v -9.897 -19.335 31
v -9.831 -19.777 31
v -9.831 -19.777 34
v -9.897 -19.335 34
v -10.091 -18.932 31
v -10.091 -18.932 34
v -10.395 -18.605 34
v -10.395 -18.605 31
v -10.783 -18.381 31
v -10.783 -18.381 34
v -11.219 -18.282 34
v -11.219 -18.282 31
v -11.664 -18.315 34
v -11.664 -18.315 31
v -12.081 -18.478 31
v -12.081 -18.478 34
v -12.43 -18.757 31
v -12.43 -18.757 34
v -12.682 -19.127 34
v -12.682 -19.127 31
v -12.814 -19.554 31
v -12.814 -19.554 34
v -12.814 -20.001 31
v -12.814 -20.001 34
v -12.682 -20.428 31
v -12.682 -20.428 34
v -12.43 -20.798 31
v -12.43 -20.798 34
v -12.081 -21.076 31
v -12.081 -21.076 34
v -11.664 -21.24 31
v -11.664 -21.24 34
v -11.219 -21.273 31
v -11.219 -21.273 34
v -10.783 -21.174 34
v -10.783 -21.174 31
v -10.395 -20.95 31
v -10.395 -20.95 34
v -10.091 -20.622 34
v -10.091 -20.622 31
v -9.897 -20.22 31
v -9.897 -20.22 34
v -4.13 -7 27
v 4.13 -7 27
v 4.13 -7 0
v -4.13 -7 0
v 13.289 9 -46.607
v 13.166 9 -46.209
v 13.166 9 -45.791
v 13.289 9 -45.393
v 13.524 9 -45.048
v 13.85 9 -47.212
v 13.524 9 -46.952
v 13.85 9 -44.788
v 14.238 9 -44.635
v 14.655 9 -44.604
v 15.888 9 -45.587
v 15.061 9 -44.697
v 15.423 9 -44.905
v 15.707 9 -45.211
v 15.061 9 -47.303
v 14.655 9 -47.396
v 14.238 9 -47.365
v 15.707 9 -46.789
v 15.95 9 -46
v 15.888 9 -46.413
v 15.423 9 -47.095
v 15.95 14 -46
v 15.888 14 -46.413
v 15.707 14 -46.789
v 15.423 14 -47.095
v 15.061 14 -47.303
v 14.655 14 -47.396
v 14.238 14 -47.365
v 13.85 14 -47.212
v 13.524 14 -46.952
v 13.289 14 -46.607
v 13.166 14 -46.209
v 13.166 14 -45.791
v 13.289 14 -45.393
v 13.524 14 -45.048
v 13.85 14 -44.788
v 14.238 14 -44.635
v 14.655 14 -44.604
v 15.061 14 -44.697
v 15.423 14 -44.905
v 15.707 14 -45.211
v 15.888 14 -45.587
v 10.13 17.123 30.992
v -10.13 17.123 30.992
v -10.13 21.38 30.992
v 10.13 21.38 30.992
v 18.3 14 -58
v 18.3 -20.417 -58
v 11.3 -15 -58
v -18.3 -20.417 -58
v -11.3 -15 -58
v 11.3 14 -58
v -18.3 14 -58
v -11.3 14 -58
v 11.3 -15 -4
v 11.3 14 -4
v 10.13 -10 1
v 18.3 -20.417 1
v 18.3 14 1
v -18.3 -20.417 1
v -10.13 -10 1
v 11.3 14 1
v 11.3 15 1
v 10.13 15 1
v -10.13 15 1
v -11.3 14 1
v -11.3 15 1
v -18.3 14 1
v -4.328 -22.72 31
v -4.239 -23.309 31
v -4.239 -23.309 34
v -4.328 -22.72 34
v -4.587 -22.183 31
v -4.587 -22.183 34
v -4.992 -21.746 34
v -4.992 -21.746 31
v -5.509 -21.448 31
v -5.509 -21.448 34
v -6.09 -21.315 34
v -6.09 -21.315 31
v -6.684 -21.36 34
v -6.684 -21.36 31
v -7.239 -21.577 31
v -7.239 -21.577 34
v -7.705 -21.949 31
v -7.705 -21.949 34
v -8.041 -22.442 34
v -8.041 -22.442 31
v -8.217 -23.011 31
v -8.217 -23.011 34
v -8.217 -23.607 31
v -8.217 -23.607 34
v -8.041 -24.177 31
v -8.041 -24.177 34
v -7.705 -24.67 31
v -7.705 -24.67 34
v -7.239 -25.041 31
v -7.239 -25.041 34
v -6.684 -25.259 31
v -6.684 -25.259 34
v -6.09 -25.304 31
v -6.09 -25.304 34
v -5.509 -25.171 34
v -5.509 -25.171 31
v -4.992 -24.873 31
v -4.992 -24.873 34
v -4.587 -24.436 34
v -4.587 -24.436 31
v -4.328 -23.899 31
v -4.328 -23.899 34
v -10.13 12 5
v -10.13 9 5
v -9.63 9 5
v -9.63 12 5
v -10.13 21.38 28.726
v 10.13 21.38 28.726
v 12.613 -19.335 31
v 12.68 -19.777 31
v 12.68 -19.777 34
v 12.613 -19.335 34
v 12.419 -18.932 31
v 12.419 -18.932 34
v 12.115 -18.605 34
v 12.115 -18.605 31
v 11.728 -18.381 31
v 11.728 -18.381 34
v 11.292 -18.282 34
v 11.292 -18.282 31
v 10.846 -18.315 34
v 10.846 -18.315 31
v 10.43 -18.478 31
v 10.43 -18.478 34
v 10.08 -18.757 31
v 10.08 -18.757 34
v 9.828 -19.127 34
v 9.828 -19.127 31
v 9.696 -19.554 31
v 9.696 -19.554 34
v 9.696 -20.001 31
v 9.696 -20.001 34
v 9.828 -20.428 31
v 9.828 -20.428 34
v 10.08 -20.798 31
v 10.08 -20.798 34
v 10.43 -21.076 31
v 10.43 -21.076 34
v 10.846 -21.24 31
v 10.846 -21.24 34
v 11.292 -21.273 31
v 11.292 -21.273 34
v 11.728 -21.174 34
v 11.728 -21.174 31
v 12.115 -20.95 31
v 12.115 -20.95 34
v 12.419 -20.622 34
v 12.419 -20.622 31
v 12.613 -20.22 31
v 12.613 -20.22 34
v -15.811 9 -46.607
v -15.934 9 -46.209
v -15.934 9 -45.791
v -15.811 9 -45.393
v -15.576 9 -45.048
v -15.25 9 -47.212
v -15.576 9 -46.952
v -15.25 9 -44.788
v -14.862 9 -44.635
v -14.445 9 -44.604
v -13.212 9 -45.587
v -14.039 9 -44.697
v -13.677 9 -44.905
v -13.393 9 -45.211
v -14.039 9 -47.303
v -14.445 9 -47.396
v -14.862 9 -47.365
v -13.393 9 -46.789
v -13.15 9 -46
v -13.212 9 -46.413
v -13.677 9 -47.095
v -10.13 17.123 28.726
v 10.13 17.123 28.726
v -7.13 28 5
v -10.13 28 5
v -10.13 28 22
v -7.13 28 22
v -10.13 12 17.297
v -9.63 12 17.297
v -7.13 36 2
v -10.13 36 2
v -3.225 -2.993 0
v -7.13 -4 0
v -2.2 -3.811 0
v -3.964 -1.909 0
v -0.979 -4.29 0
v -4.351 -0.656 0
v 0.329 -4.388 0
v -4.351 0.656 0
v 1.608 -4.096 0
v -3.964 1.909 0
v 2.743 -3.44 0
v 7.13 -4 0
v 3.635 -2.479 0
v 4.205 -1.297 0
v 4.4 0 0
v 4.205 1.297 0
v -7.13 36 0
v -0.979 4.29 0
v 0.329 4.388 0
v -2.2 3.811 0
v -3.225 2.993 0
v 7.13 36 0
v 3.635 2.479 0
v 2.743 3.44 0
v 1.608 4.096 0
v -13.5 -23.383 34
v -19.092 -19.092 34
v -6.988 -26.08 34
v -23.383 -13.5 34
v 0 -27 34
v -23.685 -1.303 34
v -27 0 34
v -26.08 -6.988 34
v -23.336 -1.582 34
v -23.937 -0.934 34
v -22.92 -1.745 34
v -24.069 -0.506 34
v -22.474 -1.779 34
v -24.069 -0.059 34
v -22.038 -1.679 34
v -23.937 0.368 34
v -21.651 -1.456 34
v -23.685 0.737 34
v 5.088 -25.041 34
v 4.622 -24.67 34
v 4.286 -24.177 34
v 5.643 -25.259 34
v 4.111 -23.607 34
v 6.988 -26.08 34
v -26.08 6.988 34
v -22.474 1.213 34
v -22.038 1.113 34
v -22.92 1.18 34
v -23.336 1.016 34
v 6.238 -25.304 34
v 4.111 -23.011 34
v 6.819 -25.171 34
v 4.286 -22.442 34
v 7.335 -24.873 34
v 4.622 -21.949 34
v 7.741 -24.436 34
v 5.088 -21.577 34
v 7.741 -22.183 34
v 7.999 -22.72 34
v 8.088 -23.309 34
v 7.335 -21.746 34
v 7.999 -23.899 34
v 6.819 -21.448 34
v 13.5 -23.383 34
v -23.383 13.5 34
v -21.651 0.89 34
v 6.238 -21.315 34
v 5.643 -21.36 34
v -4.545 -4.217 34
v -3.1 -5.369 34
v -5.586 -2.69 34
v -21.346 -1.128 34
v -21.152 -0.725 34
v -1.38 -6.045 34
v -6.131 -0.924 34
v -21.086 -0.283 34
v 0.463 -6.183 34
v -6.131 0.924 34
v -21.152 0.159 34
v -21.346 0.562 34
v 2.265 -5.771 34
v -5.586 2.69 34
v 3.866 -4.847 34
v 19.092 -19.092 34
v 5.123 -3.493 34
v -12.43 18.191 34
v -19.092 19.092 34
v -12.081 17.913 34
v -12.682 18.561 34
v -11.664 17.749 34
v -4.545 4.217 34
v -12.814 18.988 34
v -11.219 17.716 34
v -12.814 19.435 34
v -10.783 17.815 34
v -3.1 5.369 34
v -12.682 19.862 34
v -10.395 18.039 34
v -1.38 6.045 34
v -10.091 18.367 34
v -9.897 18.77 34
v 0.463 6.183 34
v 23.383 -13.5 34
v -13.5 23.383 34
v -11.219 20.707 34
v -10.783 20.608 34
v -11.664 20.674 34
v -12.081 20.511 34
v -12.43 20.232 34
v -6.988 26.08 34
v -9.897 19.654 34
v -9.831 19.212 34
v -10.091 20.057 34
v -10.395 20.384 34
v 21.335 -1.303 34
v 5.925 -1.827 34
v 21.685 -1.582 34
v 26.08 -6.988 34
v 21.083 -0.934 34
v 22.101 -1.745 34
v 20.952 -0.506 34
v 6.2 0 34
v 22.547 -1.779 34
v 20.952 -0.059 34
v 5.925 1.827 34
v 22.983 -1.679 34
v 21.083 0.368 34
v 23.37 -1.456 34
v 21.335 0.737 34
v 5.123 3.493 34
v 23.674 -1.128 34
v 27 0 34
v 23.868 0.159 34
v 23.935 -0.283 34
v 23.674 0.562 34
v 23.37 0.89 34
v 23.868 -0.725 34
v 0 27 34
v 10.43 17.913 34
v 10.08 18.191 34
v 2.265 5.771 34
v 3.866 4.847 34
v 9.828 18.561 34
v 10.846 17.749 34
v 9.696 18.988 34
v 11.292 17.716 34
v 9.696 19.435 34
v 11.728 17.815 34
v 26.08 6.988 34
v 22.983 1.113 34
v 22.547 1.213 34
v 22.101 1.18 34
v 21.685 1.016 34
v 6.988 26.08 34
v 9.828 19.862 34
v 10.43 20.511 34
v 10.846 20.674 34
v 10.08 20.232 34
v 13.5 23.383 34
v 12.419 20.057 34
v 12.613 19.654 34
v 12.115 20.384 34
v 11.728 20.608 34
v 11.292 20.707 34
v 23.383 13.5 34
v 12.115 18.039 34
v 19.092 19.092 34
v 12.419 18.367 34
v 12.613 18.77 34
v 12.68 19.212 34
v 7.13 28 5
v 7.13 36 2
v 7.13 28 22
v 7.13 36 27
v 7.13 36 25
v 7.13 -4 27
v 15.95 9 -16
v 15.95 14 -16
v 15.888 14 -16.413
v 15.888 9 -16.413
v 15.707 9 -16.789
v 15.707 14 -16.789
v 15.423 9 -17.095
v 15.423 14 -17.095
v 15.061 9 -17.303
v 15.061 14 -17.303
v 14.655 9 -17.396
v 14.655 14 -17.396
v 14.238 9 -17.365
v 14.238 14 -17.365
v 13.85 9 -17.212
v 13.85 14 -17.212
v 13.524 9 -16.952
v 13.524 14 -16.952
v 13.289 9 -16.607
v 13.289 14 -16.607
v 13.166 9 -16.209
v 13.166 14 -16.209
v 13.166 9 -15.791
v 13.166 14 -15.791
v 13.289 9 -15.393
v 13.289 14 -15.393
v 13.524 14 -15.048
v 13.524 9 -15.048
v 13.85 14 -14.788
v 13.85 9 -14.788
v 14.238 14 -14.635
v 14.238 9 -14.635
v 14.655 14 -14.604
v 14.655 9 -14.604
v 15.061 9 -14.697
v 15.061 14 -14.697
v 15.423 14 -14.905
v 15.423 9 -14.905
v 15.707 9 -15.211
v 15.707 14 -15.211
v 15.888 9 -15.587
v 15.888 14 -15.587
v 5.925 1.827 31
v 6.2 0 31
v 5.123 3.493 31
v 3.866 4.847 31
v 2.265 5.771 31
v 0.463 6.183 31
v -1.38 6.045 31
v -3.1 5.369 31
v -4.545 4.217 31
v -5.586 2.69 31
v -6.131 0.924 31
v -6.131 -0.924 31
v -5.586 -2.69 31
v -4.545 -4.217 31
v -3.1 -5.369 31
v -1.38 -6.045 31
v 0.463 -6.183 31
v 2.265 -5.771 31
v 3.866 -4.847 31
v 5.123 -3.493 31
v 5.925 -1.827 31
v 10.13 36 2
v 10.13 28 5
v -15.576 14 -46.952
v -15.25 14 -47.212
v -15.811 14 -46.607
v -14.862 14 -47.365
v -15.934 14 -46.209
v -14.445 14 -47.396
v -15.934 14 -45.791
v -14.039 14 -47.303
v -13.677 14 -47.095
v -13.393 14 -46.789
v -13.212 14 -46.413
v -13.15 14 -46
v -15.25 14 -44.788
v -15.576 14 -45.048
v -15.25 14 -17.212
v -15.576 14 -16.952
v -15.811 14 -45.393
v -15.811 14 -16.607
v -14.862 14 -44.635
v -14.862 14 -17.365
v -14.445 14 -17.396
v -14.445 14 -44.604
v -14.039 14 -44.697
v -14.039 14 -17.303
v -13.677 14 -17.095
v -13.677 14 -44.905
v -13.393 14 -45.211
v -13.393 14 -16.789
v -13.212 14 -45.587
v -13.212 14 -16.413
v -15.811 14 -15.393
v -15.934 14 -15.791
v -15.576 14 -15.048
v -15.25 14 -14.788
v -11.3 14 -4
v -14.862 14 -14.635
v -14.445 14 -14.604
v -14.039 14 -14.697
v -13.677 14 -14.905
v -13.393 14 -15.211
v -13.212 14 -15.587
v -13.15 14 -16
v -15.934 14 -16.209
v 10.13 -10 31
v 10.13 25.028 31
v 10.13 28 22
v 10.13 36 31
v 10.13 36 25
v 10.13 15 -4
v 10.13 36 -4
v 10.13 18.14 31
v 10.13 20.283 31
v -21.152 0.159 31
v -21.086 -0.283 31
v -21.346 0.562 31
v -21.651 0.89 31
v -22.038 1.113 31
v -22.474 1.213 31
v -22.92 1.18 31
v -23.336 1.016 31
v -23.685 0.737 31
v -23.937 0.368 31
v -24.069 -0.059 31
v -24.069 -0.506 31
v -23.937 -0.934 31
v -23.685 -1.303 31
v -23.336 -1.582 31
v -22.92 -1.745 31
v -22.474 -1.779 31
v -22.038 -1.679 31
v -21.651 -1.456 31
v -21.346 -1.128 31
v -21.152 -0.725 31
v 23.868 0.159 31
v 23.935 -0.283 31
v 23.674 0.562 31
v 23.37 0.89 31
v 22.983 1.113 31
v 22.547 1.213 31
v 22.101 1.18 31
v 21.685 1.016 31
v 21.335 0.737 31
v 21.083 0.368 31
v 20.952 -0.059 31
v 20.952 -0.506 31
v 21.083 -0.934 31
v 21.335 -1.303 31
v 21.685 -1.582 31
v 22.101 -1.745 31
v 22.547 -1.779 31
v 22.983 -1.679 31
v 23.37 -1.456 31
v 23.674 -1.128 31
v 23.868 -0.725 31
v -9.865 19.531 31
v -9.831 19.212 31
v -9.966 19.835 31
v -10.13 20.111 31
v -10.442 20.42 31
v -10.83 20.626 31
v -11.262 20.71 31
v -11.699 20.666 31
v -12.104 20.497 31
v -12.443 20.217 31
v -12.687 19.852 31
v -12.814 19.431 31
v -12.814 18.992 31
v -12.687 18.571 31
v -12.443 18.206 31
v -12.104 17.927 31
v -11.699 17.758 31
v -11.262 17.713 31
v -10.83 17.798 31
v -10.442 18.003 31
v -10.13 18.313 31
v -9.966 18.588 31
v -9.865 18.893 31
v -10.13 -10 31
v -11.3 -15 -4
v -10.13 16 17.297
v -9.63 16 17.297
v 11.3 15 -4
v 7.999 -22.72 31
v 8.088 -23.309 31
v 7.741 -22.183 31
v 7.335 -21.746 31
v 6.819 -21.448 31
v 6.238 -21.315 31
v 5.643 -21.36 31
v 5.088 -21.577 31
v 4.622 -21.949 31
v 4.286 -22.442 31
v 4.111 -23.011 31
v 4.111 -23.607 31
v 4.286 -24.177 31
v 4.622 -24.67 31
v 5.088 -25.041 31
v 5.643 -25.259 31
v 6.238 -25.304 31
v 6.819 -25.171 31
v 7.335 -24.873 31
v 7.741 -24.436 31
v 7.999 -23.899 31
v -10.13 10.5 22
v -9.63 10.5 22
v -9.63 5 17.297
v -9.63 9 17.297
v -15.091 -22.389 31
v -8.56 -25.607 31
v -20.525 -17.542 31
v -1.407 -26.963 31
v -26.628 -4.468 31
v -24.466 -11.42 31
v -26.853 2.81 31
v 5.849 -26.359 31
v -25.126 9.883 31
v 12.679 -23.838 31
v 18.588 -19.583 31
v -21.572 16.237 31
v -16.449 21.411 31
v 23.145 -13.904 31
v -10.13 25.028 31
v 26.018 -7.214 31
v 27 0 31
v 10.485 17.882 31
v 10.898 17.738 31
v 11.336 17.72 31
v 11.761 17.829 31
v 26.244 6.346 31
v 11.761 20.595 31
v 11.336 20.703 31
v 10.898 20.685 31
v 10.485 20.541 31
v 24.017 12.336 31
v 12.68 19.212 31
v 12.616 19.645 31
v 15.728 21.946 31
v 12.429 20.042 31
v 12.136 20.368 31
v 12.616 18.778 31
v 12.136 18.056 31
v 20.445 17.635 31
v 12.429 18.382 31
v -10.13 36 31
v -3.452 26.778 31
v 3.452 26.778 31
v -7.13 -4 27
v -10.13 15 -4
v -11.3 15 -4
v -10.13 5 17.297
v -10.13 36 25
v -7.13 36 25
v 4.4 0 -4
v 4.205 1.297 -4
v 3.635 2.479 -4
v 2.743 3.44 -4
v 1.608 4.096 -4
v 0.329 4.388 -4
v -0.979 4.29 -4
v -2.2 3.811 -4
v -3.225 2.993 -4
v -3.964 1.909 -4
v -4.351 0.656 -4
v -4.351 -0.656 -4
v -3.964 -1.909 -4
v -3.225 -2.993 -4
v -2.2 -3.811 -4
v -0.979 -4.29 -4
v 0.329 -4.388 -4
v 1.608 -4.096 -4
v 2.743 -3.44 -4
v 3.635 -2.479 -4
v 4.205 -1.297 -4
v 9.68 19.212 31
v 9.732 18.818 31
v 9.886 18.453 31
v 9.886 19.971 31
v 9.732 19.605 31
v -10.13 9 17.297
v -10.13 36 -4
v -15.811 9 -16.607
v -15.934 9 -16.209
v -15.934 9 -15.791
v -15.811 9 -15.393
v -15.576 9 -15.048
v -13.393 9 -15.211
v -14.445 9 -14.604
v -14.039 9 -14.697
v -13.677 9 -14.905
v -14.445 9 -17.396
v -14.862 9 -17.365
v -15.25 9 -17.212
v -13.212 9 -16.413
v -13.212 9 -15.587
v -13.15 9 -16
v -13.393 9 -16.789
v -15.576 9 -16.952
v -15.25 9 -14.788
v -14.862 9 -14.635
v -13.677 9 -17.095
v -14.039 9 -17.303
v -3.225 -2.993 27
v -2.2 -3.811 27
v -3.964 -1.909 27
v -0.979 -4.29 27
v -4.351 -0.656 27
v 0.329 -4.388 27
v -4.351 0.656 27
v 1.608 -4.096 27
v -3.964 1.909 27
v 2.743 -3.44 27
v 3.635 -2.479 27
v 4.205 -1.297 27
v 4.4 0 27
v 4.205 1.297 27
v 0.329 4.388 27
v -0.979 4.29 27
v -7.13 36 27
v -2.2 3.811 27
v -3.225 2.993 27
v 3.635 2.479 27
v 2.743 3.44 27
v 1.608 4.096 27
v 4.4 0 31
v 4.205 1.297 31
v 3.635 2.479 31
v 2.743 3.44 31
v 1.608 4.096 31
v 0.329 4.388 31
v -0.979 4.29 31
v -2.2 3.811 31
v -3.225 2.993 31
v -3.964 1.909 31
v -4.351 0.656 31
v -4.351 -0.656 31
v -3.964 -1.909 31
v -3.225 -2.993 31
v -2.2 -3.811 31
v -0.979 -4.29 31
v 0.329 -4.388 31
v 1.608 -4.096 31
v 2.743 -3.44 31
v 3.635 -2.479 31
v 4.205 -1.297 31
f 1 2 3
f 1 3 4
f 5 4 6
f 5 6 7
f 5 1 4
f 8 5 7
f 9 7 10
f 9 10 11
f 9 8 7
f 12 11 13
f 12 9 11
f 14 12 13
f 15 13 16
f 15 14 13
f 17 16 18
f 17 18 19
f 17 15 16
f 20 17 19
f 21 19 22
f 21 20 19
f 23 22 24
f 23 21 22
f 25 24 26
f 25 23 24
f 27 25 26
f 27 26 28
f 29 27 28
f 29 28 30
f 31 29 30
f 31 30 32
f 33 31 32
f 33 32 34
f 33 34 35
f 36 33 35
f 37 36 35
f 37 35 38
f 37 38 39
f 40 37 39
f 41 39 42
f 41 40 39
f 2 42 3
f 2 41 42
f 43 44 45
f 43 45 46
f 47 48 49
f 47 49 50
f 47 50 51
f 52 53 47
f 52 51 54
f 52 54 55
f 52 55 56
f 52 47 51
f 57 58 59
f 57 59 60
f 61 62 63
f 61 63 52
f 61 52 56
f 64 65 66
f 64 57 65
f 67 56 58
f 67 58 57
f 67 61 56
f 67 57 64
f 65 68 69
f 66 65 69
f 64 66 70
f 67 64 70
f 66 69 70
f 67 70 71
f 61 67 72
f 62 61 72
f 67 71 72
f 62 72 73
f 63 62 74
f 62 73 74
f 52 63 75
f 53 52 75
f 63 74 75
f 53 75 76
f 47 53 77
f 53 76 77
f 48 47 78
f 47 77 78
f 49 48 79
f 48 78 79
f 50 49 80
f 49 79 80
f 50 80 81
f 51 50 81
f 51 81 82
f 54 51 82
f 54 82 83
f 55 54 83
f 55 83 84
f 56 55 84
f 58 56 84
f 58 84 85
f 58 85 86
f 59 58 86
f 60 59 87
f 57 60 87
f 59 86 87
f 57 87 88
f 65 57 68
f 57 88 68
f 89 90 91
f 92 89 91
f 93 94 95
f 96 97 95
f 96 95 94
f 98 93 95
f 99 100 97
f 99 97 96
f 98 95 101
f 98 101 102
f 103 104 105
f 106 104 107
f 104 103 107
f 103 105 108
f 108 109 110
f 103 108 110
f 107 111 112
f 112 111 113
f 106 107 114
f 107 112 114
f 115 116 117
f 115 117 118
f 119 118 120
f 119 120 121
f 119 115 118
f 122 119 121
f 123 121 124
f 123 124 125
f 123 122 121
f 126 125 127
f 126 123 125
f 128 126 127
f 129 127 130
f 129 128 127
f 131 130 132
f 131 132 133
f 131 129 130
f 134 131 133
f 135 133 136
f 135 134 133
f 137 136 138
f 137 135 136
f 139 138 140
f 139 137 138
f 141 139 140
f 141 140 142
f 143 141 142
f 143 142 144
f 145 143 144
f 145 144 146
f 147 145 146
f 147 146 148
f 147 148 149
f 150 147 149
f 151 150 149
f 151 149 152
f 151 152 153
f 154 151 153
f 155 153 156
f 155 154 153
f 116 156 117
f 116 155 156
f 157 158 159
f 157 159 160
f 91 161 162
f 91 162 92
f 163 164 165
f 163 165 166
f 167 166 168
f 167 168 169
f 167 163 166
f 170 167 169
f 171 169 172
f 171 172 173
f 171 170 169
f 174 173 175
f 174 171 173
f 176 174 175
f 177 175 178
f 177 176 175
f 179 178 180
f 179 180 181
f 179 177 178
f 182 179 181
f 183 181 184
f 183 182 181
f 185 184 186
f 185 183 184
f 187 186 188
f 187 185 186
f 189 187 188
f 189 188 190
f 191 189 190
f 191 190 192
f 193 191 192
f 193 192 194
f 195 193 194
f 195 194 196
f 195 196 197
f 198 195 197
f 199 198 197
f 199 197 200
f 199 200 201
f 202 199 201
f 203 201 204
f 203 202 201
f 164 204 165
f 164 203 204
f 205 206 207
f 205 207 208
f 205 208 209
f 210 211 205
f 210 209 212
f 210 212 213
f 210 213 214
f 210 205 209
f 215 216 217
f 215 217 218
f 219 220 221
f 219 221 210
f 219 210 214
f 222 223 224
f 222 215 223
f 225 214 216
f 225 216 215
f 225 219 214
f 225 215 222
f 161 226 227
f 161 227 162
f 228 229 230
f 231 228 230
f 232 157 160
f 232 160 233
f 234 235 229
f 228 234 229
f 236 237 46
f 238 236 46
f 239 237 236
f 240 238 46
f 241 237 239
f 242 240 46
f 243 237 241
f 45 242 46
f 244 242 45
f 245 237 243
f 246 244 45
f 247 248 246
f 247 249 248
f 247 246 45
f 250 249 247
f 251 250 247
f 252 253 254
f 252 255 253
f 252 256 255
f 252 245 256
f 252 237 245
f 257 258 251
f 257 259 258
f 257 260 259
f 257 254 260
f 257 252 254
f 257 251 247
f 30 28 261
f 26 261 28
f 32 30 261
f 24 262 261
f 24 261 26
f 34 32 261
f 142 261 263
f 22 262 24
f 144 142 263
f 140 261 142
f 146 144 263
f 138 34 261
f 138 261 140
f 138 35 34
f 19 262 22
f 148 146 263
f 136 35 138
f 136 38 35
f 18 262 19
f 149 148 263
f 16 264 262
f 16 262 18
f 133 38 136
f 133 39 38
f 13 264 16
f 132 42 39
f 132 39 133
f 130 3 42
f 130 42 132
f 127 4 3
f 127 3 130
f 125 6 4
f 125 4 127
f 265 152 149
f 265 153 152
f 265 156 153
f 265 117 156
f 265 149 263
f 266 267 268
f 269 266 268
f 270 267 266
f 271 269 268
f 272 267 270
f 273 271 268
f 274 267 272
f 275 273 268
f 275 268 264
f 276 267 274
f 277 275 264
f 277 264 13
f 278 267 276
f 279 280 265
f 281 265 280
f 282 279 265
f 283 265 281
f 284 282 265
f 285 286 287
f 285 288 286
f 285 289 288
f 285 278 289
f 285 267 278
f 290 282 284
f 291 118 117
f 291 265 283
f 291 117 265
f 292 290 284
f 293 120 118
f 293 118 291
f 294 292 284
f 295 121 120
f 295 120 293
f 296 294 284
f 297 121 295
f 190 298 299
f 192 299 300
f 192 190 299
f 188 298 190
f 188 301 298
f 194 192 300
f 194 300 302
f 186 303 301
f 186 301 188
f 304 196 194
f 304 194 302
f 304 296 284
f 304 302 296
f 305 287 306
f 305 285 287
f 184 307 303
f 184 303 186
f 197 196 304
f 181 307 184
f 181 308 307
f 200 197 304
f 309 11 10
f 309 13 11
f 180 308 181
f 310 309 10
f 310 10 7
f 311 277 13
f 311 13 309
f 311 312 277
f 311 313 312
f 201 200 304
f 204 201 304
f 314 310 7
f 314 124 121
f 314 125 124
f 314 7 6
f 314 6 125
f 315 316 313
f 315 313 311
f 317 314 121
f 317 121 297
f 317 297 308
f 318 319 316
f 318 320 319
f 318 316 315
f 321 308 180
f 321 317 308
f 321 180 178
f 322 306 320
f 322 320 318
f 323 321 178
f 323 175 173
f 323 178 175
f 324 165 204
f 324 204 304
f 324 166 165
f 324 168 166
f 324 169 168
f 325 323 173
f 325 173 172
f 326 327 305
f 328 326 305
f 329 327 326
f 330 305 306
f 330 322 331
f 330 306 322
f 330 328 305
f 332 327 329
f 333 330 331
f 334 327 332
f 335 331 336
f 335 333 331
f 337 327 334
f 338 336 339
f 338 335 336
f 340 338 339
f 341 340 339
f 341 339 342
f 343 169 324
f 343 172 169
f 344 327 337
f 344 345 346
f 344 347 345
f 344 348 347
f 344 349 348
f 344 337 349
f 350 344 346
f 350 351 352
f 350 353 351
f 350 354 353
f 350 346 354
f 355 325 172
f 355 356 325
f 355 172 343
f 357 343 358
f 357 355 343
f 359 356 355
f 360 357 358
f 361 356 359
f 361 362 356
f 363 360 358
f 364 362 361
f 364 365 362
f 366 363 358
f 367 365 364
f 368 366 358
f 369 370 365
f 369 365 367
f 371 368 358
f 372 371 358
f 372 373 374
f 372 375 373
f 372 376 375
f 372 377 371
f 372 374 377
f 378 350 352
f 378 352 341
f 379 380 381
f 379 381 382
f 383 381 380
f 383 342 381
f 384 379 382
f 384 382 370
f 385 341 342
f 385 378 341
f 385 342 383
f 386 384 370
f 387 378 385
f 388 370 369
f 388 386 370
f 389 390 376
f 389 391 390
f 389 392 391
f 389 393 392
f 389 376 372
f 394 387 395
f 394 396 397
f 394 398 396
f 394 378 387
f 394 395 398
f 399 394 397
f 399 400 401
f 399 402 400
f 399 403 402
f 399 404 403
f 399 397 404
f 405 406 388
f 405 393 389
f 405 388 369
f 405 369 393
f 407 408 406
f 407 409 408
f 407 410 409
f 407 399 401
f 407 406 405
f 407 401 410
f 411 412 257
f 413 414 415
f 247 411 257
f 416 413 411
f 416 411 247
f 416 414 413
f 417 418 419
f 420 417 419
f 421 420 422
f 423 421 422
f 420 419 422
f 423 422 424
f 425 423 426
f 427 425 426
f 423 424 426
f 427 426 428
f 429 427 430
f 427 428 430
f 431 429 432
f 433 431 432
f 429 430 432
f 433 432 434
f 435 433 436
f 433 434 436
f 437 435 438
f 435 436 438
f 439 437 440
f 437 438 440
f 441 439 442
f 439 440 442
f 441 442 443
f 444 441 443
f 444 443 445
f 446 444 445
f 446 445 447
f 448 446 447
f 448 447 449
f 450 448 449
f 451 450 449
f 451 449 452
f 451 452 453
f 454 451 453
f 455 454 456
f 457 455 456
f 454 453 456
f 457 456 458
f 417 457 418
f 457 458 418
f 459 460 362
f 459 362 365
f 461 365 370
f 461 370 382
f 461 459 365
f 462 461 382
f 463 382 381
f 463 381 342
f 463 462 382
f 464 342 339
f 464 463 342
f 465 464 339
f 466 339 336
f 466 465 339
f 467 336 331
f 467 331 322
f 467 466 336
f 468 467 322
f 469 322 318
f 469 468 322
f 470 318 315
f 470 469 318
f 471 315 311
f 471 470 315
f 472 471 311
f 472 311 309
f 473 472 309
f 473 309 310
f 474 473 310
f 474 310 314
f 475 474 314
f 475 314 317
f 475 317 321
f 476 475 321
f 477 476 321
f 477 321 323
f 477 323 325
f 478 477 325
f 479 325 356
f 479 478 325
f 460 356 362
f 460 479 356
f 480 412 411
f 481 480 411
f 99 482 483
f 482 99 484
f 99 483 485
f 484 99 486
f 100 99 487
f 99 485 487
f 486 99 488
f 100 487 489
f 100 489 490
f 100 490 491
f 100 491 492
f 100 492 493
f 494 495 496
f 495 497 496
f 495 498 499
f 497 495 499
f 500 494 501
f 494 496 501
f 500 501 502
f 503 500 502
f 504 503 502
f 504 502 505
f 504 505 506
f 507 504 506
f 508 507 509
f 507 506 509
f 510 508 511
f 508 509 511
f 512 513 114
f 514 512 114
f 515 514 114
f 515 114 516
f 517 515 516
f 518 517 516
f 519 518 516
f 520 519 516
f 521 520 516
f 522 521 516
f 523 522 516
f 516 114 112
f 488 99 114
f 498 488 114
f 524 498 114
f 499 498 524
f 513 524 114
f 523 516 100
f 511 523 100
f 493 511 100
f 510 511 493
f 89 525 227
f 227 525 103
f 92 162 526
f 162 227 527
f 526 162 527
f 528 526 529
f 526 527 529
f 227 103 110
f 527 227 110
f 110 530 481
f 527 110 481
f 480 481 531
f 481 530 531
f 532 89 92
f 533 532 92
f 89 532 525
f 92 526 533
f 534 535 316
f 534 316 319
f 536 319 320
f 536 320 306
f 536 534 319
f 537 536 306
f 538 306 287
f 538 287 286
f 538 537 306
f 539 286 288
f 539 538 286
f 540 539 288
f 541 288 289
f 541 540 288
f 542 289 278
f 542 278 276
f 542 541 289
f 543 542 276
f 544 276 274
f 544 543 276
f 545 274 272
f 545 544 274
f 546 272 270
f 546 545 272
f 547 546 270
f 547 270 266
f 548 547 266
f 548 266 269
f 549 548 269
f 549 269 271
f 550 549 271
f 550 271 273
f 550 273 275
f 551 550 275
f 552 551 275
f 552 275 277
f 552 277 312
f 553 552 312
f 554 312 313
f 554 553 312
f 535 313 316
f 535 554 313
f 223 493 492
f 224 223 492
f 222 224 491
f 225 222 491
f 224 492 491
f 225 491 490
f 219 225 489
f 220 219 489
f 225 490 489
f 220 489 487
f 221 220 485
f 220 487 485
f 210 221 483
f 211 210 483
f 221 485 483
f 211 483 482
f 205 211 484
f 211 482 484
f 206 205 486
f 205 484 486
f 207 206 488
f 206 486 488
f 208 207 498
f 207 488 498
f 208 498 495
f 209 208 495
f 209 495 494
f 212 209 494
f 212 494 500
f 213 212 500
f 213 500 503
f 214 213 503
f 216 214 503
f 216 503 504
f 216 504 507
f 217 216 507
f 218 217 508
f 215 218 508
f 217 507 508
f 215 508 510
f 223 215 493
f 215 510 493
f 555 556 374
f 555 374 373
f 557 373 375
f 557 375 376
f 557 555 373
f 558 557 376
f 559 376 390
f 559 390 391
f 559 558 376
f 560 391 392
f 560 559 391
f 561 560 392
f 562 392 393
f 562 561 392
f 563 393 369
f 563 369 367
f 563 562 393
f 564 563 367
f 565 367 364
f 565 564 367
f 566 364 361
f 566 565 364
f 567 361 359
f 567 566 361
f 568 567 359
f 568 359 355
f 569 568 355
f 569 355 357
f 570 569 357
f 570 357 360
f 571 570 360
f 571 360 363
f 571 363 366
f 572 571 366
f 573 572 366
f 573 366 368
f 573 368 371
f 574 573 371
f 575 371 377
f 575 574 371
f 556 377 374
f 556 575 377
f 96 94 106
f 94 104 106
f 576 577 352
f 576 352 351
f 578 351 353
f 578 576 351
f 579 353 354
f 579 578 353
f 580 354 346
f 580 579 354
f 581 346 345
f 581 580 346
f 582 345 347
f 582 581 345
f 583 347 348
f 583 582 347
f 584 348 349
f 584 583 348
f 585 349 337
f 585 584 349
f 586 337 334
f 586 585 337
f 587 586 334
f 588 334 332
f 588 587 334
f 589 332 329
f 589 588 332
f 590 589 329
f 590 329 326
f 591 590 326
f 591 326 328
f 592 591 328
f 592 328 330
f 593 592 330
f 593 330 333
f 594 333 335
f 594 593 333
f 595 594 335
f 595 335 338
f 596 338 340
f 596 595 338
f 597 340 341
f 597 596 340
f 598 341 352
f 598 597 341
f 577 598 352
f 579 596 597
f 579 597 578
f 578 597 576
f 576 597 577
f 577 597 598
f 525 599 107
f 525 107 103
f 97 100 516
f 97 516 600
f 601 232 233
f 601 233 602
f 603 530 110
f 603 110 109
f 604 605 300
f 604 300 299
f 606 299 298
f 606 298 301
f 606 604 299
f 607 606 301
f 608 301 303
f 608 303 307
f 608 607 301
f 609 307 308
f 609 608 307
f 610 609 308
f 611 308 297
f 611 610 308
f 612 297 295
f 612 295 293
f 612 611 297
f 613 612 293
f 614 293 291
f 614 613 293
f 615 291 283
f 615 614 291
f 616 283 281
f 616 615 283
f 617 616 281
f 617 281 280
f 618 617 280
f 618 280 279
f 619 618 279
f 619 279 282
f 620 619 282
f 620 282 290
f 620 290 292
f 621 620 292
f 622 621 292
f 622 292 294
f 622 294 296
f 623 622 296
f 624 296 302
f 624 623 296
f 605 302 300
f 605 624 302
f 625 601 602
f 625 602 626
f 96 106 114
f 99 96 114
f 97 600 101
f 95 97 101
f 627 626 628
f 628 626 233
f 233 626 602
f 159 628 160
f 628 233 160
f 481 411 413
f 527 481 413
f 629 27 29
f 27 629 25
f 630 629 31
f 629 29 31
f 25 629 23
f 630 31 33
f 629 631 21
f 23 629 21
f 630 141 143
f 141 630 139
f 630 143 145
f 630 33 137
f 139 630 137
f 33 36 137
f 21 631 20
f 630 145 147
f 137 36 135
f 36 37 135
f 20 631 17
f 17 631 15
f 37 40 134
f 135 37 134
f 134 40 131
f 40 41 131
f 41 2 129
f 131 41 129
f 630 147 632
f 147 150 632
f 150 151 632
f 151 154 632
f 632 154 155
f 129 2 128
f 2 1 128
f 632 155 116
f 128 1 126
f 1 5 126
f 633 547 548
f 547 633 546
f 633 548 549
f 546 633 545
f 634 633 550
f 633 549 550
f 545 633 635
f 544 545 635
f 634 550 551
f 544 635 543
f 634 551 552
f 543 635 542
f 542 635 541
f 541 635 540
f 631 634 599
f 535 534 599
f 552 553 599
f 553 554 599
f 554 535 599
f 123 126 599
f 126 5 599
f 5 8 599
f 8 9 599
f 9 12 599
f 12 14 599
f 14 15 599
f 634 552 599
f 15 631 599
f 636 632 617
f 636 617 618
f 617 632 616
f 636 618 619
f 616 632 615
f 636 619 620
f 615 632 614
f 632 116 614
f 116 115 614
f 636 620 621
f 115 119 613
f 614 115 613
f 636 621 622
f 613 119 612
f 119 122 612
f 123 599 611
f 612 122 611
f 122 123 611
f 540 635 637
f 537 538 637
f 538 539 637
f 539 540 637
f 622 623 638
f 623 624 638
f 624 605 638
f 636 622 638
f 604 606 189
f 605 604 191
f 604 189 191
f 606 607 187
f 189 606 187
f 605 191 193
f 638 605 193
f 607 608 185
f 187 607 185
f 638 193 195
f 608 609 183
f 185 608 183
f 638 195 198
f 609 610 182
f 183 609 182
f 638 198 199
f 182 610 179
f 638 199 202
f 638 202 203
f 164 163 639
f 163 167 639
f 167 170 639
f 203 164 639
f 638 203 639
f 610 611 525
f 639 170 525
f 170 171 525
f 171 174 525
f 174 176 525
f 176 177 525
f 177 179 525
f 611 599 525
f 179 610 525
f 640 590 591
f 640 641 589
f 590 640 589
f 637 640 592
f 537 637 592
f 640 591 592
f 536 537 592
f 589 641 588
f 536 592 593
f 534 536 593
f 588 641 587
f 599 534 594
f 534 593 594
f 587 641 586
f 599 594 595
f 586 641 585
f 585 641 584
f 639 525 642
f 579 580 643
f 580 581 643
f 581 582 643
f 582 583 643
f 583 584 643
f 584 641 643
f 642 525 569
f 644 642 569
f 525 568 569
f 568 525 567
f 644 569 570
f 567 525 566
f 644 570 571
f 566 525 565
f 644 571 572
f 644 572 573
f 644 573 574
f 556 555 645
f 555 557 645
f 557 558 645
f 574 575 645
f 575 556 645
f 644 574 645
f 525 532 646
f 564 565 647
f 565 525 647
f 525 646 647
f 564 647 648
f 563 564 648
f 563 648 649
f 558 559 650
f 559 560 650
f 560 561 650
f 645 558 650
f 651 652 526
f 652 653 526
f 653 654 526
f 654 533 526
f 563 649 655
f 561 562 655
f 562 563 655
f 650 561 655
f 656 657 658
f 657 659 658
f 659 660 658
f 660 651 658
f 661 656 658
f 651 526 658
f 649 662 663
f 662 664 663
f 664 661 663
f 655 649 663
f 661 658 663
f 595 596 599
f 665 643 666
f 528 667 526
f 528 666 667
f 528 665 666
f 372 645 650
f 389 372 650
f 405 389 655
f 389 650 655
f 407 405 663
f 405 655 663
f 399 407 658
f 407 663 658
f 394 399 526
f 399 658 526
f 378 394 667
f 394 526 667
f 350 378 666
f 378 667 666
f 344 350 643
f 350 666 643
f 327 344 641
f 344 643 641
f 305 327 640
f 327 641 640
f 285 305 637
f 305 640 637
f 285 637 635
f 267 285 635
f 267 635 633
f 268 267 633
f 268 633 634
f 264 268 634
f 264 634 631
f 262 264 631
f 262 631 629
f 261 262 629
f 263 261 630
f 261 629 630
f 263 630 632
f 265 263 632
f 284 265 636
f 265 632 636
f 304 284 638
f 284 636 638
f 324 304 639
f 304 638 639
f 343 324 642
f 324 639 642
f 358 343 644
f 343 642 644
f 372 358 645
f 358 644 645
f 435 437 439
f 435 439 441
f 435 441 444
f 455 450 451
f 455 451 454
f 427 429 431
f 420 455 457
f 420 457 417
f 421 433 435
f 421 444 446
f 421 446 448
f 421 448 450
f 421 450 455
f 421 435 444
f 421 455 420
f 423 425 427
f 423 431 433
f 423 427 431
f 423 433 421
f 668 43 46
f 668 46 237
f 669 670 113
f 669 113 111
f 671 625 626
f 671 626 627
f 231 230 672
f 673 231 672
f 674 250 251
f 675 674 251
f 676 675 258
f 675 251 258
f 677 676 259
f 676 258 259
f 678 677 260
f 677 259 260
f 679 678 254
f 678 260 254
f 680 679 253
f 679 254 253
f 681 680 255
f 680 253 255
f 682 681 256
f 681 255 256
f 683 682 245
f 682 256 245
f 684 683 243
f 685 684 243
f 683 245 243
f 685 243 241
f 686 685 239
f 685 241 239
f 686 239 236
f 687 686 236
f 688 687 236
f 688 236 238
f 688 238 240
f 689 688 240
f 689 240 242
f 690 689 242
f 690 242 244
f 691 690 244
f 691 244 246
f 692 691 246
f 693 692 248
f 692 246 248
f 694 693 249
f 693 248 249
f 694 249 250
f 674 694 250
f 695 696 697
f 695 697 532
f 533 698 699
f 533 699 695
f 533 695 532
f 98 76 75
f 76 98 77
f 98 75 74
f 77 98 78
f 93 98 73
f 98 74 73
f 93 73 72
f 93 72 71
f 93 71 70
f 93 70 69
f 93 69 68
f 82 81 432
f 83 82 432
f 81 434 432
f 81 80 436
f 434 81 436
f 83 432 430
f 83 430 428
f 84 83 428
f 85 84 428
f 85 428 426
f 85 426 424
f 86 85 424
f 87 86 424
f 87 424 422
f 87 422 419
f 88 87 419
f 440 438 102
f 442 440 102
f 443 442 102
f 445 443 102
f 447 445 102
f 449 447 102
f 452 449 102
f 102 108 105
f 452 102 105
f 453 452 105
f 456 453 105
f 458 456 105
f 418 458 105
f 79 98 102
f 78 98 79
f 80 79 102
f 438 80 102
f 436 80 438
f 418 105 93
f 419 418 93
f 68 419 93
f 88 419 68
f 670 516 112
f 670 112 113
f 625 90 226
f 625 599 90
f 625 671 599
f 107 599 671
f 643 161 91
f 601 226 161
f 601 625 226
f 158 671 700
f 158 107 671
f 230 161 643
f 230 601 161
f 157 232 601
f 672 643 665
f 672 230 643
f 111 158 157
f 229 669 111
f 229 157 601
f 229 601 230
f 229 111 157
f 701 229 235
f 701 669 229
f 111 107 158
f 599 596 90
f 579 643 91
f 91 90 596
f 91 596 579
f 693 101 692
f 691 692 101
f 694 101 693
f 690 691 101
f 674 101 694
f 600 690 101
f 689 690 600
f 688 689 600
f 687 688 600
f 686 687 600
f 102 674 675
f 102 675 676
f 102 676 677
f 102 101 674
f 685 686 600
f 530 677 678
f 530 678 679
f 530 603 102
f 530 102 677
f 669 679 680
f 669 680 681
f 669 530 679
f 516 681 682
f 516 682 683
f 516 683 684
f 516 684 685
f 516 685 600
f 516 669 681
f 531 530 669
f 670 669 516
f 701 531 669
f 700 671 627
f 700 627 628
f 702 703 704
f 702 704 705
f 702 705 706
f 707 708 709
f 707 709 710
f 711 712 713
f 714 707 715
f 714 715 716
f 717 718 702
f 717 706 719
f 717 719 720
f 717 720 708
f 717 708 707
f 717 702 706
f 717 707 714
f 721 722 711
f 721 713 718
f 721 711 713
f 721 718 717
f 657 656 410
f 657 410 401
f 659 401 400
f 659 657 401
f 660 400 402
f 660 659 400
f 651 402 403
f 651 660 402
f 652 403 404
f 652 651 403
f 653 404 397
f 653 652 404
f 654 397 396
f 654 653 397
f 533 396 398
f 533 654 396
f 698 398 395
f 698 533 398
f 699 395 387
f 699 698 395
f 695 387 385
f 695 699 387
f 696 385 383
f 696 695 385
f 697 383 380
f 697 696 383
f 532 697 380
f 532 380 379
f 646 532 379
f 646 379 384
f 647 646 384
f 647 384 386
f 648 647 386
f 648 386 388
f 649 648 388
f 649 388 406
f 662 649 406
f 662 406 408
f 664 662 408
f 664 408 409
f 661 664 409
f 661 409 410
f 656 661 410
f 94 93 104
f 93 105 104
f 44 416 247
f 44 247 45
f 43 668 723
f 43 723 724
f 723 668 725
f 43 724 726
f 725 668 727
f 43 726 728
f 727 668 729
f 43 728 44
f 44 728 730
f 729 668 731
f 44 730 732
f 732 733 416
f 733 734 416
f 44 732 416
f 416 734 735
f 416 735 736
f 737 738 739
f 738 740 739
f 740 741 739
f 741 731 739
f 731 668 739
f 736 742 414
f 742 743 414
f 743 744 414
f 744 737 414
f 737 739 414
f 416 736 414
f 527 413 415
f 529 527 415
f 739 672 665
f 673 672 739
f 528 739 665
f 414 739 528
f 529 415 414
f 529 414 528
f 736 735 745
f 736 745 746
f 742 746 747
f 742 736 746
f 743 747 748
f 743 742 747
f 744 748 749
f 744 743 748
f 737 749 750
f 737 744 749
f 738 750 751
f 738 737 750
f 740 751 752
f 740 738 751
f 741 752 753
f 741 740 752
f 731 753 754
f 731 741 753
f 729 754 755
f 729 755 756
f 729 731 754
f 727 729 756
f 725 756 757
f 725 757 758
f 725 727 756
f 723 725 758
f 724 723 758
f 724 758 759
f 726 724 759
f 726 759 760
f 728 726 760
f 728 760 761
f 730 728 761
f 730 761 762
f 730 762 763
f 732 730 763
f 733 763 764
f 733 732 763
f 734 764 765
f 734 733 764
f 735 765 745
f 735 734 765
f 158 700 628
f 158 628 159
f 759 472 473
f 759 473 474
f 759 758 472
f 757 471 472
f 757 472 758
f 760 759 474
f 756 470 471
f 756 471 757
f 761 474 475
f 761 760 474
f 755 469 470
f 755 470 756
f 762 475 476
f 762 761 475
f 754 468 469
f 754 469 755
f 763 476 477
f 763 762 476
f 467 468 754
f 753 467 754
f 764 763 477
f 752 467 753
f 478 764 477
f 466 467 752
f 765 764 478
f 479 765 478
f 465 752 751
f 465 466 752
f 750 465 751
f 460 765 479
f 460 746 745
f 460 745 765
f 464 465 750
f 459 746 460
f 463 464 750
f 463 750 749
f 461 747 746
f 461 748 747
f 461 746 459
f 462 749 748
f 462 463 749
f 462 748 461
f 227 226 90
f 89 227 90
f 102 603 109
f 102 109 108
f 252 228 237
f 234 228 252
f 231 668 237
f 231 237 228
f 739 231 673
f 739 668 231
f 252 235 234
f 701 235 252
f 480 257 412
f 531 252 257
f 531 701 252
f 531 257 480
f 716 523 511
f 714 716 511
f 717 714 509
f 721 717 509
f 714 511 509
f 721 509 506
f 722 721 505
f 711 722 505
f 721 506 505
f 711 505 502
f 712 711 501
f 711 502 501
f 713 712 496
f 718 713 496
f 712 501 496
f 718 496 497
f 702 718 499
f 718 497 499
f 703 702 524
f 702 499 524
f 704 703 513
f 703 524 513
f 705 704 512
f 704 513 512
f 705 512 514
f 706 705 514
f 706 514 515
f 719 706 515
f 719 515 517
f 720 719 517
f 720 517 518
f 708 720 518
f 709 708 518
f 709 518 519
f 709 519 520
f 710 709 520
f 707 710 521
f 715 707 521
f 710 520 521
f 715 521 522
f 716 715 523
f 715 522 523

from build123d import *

# Parameters (mm, degrees)
EXTRUDE_1_DEPTH     = 13.5
SKETCH_1_3_W        = 20.26
SKETCH_1_3_H        = 46
SKETCH_1_3_R        = 4.4
EXTRUDE_2_DEPTH     = 4
CUT_EXTRUDE_1_DEPTH = 40
CUT_EXTRUDE_2_DEPTH = 0.5
SKETCH_4_R          = 27
SKETCH_4_R_2        = 6.2
SKETCH_4_R_3        = 2
SKETCH_4_R_4        = 1.5
EXTRUDE_3_DEPTH     = 3
SKETCH_8_W          = 2.265156823
SKETCH_8_H          = 4.257571482
CUT_EXTRUDE_4_DEPTH = 30
EXTRUDE_11_DEPTH    = 5
EXTRUDE_12_DEPTH    = 5
EXTRUDE_13_DEPTH    = 54
SKETCH_13_R         = 1.4
CUT_EXTRUDE_5_DEPTH = 5
SKETCH_14_R         = 1.4
CUT_EXTRUDE_6_DEPTH = 5


with BuildPart() as part:
    # 草图1 → 凸台-拉伸1 (new body)
    with BuildSketch(Plane.XY):
        Polygon((4.13, -7), (-4.13, -7), (-7.13, -4), (-7.13, 36), (-10.13, 36), (-10.13, -10), (10.13, -10), (10.13, 36), (7.13, 36), (7.13, -4), align=None)
    extrude_1 = extrude(amount=EXTRUDE_1_DEPTH)

    # 草图1<3> → 凸台-拉伸2 (add)
    with BuildSketch(Plane.XY):
        with Locations((0, 13)):
            Rectangle(SKETCH_1_3_W, SKETCH_1_3_H)
        Circle(SKETCH_1_3_R, mode=Mode.SUBTRACT)
    extrude_2 = extrude(amount=-EXTRUDE_2_DEPTH)

    # 镜向1: 凸台-拉伸1, 凸台-拉伸2 across plane
    add(extrude_1.mirror(Plane.XY.offset(13.5)))
    add(extrude_2.mirror(Plane.XY.offset(13.5)))

    # 草图2 → 切除-拉伸1 (cut)
    with BuildSketch(Plane.ZY.offset(10.13)):
        Polygon((2, 36), (5, 28), (22, 28), (25, 36), align=None)
    extrude(amount=-CUT_EXTRUDE_1_DEPTH, mode=Mode.SUBTRACT)

    # 草图3 → 切除-拉伸2 (cut)
    with BuildSketch(Plane.ZY.offset(10.13)):
        Polygon((5, 12), (17.297318311, 12), (17.297318311, 16), (22, 10.5), (17.297318311, 5), (17.297318311, 9), (5, 9), align=None)
    extrude(amount=-CUT_EXTRUDE_2_DEPTH, mode=Mode.SUBTRACT)

    # 草图4 → 凸台-拉伸3 (add)
    with BuildSketch(Plane.XY.offset(31)):
        Circle(SKETCH_4_R)
        Circle(SKETCH_4_R_2, mode=Mode.SUBTRACT)
        with Locations((6.088327702, -23.309373565)):
            Circle(SKETCH_4_R_3, mode=Mode.SUBTRACT)
        with Locations((22.434887901, -0.282877885)):
            Circle(SKETCH_4_R_4, mode=Mode.SUBTRACT)
        with Locations((11.179706516, 19.211668123)):
            Circle(SKETCH_4_R_4, mode=Mode.SUBTRACT)
        with Locations((-11.330656255, 19.211668123)):
            Circle(SKETCH_4_R_4, mode=Mode.SUBTRACT)
        with Locations((-22.58583764, -0.282877885)):
            Circle(SKETCH_4_R_4, mode=Mode.SUBTRACT)
        with Locations((-11.330656255, -19.777423893)):
            Circle(SKETCH_4_R_4, mode=Mode.SUBTRACT)
        with Locations((11.179706516, -19.777423893)):
            Circle(SKETCH_4_R_4, mode=Mode.SUBTRACT)
        with Locations((-6.239277441, -23.309373565)):
            Circle(SKETCH_4_R_3, mode=Mode.SUBTRACT)
    extrude(amount=EXTRUDE_3_DEPTH)

    # 草图8 → 切除-拉伸4 (cut)
    with BuildSketch(Plane(origin=(-10.13, 0, 0.991647231), x_dir=(0, 0, 1), z_dir=(-1, 0, 0))):
        with Locations((28.867421589, 19.251576228)):
            Rectangle(SKETCH_8_W, SKETCH_8_H)
    extrude(amount=-CUT_EXTRUDE_4_DEPTH, mode=Mode.SUBTRACT)

    # 草图11 → 凸台-拉伸11 (add)
    with BuildSketch(Plane(origin=(0, 0, -4), x_dir=(-1, 0, 0), z_dir=(0, 0, -1))):
        Polygon((10.13, 15), (10.13, -10), (-10.13, -10), (-10.13, 15), (-11.3, 15), (-11.3, -15), (11.3, -15), (11.3, 15), align=None)
    extrude(amount=-EXTRUDE_11_DEPTH)

    # 草图11<3> → 凸台-拉伸12 (add)
    with BuildSketch(Plane(origin=(0, 0, -4), x_dir=(-1, 0, 0), z_dir=(0, 0, -1))):
        Polygon((11.3, 14), (11.3, 0), (11.3, -15), (-11.3, -15), (-11.3, 14), (-18.3, 14), (-18.3, -17.416972989), (-18.3, -20.416972989), (18.3, -20.416972989), (18.3, 14), align=None)
    extrude(amount=-EXTRUDE_12_DEPTH)

    # 草图11<4> → 凸台-拉伸13 (add)
    with BuildSketch(Plane(origin=(0, 0, -4), x_dir=(-1, 0, 0), z_dir=(0, 0, -1))):
        Polygon((11.3, 14), (11.3, 0), (11.3, -15), (-11.3, -15), (-11.3, 14), (-18.3, 14), (-18.3, -17.416972989), (-18.3, -20.416972989), (18.3, -20.416972989), (18.3, 14), align=None)
    extrude(amount=EXTRUDE_13_DEPTH)

    # 草图13 → 切除-拉伸5 (cut)
    with BuildSketch(Plane(origin=(0, 14, 0), x_dir=(1, 0, 0), z_dir=(0, 1, 0))):
        with Locations((-14.55, 16)):
            Circle(SKETCH_13_R)
        with Locations((-14.55, 46)):
            Circle(SKETCH_13_R)
    extrude(amount=-CUT_EXTRUDE_5_DEPTH, mode=Mode.SUBTRACT)

    # 草图14 → 切除-拉伸6 (cut)
    with BuildSketch(Plane(origin=(0, 14, 0), x_dir=(1, 0, 0), z_dir=(0, 1, 0))):
        with Locations((14.55, 16)):
            Circle(SKETCH_14_R)
        with Locations((14.55, 46)):
            Circle(SKETCH_14_R)
    extrude(amount=-CUT_EXTRUDE_6_DEPTH, mode=Mode.SUBTRACT)


solid = part.part
